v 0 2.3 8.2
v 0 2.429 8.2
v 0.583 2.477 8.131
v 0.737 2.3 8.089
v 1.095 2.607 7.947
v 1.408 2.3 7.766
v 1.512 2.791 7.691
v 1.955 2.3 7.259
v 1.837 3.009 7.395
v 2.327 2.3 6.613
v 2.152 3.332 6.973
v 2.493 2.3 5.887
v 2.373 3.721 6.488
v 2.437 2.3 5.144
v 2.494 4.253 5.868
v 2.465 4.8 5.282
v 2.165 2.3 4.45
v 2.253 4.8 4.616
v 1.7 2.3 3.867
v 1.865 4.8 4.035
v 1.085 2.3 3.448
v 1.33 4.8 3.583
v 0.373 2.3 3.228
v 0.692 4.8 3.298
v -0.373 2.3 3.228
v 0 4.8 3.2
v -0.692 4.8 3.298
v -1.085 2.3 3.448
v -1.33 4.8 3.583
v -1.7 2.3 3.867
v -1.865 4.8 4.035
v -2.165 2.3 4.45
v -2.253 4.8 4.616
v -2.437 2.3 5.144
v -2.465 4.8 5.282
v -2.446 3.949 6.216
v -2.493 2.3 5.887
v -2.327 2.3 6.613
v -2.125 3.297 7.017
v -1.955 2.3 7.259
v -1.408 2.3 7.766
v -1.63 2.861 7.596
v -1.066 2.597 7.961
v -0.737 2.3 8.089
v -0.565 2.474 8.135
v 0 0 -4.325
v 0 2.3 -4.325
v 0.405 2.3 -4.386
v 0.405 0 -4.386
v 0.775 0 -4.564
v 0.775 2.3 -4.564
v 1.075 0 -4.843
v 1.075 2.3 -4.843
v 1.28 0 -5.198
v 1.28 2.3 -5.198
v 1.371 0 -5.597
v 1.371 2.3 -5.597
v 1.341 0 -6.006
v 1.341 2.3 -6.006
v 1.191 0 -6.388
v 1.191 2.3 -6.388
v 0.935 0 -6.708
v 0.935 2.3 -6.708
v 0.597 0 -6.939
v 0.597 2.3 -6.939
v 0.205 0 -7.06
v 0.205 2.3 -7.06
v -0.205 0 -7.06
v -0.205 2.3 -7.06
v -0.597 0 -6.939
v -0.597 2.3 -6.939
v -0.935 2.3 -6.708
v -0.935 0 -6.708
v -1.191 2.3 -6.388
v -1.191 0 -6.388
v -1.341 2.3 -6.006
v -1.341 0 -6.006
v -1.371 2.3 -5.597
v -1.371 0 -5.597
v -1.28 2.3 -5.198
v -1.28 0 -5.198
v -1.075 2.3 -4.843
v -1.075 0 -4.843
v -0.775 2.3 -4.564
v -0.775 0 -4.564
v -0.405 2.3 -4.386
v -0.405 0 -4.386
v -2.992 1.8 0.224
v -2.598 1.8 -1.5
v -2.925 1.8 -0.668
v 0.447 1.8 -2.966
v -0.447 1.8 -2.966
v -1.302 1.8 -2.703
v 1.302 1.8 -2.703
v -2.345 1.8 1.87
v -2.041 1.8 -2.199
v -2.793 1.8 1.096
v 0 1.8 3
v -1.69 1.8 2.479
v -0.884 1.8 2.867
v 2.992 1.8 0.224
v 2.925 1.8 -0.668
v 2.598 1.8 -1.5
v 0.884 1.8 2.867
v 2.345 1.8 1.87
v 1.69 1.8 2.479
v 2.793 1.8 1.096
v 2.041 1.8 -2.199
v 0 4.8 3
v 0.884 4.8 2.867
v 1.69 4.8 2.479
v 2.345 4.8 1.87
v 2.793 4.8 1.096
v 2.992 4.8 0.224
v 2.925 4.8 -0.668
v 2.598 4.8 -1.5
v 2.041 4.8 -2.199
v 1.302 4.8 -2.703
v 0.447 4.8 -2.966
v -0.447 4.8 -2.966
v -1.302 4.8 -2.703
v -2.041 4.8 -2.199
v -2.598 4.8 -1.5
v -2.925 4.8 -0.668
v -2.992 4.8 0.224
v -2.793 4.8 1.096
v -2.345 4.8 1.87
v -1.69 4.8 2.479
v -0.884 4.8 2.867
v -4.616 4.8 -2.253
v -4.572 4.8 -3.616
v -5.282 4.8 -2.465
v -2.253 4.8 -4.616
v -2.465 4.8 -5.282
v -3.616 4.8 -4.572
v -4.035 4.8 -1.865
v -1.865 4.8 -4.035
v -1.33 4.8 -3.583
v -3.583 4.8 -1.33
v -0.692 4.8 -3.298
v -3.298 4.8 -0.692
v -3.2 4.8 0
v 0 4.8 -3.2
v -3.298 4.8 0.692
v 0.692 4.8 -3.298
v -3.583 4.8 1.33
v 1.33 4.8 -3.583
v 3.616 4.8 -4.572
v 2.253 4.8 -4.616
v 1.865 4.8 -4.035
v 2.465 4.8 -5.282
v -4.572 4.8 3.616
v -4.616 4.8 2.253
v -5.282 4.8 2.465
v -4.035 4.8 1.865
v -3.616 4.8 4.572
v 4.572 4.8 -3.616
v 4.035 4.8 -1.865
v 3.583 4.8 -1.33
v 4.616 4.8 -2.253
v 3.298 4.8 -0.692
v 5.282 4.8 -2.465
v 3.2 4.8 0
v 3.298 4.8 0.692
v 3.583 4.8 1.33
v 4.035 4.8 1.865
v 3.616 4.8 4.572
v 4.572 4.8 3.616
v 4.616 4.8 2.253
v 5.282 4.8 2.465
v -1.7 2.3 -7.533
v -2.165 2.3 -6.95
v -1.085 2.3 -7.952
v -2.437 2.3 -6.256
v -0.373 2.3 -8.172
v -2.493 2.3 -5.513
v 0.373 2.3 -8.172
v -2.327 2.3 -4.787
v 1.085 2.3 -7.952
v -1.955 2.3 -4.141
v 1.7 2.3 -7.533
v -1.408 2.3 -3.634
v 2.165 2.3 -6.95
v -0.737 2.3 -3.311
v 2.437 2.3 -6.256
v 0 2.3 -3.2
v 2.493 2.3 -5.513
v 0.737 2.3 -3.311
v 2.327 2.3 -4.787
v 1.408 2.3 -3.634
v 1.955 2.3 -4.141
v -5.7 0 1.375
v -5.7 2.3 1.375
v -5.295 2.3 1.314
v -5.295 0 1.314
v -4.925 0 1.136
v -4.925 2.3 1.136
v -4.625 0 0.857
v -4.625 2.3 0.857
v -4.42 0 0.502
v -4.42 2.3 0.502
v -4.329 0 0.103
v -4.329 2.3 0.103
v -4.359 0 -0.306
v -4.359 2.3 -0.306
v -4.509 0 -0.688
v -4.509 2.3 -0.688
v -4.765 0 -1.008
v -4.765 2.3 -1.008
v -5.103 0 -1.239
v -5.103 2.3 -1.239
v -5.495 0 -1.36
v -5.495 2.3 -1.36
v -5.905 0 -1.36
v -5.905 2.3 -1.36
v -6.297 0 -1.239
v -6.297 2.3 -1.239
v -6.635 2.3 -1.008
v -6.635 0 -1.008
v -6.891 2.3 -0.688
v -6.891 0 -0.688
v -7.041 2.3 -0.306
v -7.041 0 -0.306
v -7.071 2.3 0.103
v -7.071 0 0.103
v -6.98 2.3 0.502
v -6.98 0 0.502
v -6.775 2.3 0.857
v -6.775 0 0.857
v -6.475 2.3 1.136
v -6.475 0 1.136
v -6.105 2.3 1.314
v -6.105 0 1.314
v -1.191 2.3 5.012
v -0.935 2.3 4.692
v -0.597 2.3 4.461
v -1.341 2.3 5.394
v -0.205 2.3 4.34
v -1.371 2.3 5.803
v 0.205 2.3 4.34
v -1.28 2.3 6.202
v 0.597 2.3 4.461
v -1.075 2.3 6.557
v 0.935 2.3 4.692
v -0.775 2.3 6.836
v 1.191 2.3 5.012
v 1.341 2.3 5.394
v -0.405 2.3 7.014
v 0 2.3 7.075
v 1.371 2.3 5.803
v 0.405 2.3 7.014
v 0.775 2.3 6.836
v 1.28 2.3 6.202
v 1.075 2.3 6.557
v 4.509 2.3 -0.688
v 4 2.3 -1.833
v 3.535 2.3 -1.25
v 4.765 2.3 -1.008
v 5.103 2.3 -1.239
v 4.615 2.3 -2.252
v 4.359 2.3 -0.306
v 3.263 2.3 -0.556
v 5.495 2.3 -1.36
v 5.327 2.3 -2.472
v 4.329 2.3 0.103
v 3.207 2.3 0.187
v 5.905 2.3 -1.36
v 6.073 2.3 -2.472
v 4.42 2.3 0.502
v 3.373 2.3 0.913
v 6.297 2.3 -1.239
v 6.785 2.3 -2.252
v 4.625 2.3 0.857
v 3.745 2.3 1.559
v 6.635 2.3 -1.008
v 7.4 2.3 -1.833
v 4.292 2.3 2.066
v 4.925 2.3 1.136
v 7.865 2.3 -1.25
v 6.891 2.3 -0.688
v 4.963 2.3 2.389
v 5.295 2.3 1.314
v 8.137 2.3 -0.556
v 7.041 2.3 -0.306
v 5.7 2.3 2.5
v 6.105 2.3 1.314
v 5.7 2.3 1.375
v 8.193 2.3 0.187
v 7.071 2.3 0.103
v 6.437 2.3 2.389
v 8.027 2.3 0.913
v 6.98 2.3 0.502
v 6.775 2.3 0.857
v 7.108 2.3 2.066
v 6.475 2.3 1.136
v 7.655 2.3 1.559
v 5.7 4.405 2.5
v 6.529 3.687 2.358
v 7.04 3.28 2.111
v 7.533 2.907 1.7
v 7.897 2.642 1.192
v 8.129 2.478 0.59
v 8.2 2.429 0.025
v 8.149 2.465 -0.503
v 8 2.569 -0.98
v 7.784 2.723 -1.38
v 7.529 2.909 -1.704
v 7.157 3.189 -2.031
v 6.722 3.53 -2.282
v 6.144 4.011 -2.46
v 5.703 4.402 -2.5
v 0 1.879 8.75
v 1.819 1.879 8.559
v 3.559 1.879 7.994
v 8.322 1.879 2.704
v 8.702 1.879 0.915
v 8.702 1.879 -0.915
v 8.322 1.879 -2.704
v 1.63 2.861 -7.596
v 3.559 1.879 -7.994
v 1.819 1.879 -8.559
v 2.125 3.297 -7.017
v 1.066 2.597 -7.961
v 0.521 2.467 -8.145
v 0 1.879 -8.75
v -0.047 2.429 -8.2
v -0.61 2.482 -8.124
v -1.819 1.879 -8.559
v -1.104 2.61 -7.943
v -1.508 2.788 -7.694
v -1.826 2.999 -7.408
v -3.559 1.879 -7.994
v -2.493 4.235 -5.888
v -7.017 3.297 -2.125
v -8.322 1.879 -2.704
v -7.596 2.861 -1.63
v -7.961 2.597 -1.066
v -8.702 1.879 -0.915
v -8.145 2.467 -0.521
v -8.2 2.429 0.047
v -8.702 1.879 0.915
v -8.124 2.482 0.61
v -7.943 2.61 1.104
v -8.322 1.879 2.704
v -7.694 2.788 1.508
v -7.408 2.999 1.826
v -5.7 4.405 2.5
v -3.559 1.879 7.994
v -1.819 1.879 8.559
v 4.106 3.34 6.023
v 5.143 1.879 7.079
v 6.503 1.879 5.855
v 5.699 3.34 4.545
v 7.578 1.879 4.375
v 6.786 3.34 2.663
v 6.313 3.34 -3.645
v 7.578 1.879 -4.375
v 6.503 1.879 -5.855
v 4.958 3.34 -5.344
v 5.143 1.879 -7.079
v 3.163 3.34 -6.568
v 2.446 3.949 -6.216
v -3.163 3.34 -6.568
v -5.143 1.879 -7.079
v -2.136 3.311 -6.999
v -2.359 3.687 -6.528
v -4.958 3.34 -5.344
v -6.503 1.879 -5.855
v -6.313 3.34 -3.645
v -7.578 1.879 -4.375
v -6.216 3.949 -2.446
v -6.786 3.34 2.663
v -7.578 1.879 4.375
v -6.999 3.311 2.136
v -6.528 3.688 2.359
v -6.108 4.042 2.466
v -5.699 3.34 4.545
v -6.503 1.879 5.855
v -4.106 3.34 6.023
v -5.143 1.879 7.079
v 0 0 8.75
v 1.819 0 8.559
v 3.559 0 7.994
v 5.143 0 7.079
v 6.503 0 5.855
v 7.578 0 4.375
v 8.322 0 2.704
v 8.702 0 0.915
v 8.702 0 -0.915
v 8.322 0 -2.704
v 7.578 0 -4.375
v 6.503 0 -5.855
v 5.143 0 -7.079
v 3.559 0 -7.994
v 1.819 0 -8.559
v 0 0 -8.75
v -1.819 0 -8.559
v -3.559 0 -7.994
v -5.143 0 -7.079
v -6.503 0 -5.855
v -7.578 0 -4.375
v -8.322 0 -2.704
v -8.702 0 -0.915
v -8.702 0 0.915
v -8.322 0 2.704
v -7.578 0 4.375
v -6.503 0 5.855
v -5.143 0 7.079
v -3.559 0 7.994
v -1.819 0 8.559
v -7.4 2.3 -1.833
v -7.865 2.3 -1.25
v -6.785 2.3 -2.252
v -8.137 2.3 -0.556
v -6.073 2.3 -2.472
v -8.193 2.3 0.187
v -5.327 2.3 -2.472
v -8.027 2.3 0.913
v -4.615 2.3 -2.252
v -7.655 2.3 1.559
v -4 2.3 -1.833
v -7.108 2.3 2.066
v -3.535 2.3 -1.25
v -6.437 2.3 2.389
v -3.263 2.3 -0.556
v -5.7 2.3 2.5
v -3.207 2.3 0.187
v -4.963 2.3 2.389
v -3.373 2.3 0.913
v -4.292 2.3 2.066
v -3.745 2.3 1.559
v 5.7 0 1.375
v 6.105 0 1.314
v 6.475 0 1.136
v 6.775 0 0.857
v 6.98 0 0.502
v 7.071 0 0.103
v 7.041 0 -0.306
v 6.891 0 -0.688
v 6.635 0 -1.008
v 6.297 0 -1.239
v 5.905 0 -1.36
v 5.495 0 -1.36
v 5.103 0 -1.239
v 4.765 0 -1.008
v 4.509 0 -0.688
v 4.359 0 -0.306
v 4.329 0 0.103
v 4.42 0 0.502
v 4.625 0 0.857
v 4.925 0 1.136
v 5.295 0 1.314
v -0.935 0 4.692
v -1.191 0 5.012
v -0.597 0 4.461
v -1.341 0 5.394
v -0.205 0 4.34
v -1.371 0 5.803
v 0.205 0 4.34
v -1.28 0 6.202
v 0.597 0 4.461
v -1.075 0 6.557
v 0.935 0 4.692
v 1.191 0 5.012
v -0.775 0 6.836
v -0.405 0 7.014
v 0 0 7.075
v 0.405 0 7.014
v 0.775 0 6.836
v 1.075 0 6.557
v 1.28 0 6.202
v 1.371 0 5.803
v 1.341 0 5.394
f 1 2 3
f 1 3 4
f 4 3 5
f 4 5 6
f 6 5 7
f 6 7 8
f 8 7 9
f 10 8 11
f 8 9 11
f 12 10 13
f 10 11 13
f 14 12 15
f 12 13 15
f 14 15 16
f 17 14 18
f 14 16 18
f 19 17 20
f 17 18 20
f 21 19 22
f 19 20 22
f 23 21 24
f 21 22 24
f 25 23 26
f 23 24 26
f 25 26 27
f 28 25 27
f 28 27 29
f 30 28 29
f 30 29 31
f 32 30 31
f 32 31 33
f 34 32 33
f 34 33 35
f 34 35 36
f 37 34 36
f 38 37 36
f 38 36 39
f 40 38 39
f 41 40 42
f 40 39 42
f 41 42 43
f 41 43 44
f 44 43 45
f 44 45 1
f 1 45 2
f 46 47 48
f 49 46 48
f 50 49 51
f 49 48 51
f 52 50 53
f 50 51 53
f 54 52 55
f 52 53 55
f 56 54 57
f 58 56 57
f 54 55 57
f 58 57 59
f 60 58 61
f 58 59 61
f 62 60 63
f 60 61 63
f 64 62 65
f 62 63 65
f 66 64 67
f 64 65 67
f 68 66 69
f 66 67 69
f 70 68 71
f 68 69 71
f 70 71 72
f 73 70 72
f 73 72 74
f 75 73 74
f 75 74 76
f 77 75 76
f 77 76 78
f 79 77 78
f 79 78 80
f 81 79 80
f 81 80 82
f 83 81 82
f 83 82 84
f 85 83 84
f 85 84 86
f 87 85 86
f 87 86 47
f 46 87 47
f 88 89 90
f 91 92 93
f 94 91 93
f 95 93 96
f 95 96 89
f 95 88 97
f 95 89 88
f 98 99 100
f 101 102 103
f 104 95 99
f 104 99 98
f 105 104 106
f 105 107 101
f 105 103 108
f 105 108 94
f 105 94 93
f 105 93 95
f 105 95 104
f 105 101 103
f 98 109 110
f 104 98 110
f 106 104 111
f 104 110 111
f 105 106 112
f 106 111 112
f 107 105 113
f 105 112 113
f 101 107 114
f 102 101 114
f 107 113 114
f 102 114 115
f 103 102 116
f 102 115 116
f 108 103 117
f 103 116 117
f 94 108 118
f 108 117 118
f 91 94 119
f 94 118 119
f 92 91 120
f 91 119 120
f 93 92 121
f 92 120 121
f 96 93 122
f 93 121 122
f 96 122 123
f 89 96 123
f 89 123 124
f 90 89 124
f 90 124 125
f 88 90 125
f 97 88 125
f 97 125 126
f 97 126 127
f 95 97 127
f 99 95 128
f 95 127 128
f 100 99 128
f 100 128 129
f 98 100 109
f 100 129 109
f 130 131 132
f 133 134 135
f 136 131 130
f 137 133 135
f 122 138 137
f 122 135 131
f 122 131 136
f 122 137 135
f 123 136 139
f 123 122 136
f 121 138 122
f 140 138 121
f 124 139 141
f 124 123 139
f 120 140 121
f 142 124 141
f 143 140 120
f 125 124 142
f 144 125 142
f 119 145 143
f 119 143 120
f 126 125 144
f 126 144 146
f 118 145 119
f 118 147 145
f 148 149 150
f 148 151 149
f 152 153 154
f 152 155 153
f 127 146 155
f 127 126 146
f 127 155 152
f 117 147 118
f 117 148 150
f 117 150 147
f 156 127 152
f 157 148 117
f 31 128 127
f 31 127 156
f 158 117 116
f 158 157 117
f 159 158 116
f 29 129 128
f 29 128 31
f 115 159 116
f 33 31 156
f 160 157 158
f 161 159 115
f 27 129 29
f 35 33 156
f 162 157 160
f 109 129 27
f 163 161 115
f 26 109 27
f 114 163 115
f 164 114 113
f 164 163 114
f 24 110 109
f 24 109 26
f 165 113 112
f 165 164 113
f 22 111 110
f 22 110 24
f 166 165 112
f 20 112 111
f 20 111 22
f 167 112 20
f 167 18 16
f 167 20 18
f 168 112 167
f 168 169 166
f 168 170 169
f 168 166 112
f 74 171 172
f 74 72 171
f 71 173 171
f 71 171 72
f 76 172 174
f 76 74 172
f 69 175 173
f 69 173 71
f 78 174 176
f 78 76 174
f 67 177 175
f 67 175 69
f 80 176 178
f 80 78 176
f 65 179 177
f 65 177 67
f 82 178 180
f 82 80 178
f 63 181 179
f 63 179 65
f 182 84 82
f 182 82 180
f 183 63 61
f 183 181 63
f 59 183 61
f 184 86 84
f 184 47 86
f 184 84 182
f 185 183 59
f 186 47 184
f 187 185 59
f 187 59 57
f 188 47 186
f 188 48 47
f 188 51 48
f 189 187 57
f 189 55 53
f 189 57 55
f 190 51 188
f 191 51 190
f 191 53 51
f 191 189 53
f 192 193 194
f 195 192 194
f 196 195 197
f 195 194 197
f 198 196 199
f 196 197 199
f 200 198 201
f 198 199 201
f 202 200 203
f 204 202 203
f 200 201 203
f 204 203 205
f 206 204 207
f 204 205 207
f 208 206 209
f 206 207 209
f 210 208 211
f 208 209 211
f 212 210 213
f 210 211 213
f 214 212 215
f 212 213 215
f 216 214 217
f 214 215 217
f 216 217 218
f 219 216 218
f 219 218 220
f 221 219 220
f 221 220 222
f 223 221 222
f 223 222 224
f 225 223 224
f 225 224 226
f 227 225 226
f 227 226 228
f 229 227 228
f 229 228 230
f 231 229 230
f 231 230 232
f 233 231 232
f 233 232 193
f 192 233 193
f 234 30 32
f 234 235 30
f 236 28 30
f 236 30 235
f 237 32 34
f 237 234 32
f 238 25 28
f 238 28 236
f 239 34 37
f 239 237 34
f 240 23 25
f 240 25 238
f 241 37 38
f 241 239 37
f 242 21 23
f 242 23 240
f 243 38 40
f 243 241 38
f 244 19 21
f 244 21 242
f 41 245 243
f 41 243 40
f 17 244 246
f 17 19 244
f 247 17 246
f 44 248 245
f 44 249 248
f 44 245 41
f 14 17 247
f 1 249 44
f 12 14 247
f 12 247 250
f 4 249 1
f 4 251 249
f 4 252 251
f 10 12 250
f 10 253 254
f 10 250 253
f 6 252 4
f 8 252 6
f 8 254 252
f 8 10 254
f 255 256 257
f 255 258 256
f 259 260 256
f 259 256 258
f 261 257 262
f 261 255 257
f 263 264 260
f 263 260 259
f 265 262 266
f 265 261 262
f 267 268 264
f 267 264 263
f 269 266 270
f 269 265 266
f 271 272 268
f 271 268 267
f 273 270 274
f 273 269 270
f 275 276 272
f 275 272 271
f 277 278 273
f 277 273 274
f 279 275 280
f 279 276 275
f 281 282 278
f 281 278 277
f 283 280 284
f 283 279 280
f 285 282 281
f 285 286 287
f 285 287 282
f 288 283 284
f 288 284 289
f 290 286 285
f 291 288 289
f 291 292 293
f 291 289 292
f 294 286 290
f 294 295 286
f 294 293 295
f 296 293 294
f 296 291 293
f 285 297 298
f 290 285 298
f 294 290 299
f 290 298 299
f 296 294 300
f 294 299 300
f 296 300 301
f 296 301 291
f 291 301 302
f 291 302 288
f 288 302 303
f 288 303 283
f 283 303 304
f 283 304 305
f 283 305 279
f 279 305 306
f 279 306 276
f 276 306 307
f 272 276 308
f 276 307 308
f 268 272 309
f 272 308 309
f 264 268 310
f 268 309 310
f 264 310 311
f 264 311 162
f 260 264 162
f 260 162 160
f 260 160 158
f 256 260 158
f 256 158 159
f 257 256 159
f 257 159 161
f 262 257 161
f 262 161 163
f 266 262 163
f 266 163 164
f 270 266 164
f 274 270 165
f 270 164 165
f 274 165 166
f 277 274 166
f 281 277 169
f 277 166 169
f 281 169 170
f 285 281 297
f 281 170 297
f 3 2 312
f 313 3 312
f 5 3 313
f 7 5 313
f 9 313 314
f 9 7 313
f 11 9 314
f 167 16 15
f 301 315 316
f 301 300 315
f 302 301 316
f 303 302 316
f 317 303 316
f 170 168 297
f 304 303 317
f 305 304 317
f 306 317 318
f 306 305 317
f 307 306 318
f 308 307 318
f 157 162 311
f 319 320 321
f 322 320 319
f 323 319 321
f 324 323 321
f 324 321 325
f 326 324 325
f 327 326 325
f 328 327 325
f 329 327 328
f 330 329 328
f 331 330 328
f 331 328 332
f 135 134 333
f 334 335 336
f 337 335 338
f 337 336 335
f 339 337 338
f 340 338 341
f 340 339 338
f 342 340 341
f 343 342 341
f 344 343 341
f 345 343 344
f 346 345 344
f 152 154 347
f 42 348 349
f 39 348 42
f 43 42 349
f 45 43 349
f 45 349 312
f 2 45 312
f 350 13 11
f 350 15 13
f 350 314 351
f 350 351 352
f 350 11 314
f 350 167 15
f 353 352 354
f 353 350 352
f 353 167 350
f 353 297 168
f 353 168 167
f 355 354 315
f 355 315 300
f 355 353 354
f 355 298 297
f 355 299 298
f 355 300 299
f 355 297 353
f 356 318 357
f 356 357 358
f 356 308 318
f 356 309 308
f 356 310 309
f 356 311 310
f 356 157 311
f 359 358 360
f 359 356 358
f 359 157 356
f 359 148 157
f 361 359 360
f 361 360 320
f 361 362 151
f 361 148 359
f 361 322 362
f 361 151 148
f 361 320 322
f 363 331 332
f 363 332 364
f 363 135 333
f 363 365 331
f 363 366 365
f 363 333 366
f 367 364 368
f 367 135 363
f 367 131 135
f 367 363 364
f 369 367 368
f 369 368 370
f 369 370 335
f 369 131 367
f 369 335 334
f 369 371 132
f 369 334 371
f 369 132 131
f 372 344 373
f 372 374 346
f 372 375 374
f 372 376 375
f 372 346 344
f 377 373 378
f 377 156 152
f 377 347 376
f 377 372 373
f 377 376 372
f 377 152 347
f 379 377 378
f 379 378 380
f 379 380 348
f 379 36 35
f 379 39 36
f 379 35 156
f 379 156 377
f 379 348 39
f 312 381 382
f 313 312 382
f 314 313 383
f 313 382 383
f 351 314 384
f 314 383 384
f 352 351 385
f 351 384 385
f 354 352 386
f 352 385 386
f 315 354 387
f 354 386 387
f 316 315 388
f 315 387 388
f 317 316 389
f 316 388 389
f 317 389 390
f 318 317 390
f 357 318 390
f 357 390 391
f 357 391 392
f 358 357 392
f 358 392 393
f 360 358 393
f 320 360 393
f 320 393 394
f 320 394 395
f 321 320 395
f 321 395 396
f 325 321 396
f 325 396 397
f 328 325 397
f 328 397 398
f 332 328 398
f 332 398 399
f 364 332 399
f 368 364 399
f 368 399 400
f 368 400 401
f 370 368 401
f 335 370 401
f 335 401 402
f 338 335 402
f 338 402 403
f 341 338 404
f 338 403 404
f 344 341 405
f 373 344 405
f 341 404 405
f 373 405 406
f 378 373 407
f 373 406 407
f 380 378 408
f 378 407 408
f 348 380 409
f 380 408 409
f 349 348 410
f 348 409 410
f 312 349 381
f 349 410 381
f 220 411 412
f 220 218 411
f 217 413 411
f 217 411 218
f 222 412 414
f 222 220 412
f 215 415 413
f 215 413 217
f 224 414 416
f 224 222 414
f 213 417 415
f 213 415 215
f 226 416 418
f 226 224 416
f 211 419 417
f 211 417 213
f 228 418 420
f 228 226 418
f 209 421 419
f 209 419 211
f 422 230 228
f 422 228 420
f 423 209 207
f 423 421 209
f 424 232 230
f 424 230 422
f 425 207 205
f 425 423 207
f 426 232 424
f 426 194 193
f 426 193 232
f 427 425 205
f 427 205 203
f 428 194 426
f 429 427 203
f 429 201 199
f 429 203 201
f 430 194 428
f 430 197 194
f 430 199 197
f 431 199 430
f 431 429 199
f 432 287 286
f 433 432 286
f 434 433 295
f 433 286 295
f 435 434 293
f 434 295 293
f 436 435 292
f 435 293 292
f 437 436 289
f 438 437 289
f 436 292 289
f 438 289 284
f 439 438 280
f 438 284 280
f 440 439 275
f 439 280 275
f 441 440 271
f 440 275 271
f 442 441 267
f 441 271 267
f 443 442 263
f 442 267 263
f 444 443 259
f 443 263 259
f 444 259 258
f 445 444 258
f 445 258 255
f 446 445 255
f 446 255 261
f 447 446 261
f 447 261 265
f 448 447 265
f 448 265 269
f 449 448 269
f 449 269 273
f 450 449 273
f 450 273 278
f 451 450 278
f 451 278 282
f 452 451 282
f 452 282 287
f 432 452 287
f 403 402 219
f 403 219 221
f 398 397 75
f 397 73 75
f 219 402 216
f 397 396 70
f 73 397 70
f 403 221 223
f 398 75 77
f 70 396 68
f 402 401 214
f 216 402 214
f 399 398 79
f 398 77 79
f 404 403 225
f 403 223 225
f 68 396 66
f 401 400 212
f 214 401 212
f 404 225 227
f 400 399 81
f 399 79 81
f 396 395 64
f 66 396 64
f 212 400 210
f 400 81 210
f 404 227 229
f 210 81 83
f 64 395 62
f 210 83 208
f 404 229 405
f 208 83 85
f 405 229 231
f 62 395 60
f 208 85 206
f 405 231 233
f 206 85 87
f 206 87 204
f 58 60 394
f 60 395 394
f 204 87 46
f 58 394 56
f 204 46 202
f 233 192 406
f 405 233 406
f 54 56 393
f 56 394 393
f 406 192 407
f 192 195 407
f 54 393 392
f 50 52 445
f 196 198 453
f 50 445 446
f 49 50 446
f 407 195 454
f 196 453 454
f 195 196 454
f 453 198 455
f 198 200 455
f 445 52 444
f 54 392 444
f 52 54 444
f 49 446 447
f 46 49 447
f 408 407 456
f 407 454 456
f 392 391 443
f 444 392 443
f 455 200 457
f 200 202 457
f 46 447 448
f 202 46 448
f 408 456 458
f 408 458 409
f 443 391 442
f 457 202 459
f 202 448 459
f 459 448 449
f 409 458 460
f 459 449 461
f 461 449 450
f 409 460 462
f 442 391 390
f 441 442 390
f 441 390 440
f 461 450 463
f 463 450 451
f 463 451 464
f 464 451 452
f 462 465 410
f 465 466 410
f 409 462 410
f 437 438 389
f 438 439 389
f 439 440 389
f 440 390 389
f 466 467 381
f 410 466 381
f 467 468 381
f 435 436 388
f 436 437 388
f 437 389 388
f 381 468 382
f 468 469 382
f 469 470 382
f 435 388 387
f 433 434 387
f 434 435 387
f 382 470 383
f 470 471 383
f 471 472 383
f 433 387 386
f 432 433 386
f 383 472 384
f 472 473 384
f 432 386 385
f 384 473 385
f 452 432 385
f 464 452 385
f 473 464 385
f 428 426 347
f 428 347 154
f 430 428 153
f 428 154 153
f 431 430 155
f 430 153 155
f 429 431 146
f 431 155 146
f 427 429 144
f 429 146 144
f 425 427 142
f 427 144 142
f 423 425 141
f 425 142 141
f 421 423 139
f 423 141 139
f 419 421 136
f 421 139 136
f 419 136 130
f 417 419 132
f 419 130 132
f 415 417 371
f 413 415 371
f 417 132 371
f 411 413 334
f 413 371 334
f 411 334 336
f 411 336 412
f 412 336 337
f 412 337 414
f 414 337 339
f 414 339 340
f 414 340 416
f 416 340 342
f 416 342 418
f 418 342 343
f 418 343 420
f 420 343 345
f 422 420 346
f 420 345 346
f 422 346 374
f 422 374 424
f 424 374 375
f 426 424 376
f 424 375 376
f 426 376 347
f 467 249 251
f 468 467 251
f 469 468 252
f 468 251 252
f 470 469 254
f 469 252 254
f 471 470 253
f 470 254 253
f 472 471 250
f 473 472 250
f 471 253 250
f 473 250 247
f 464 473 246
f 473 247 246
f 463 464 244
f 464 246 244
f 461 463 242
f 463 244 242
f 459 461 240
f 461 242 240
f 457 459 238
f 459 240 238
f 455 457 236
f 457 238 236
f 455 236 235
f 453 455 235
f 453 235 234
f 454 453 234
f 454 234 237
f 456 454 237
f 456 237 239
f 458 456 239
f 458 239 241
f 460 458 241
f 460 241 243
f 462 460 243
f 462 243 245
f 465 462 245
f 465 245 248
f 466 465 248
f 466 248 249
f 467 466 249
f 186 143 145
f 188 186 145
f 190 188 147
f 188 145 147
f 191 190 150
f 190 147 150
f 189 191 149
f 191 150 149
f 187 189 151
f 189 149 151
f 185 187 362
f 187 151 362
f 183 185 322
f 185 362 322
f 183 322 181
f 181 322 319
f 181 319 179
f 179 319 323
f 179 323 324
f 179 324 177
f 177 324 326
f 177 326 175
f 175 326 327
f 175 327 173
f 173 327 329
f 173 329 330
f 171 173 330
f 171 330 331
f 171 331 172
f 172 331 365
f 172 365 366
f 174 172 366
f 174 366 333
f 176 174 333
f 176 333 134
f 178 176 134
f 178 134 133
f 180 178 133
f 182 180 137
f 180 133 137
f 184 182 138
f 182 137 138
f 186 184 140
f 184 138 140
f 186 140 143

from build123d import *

# Parameters (mm, degrees)
SKETCH1_R           = 8.75
BOSS_EXTRUDE1_DEPTH = 4.8
SKETCH2_R           = 3
CUT_EXTRUDE1_DEPTH  = 3
SKETCH3_R           = 2.5
CUT_EXTRUDE2_DEPTH  = 2.5
SKETCH4_R           = 1.375
CUT_EXTRUDE3_DEPTH  = 2.5
CHAMFER1_SIZE       = 2.921


with BuildPart() as part:
    # Sketch1 → Boss-Extrude1 (new body)
    with BuildSketch(Plane(origin=(0, 0, 0), x_dir=(1, 0, 0), z_dir=(0, 1, 0))):
        with Locations(Location((0, 0, 0), (0, 0, 270))):
            Circle(SKETCH1_R)
    extrude(amount=BOSS_EXTRUDE1_DEPTH)

    # Sketch2 → Cut-Extrude1 (cut)
    with BuildSketch(Plane(origin=(0, 4.8, 0), x_dir=(1, 0, 0), z_dir=(0, 1, 0))):
        with Locations(Location((0, 0, 0), (0, 0, 270))):
            Circle(SKETCH2_R)
    extrude(amount=-CUT_EXTRUDE1_DEPTH, mode=Mode.SUBTRACT)

    # Sketch3 → Cut-Extrude2 (cut)
    with BuildSketch(Plane(origin=(0, 4.8, 0), x_dir=(1, 0, 0), z_dir=(0, 1, 0))):
        with Locations(Location((-5.7, 0, 0), (0, 0, 270))):
            Circle(SKETCH3_R)
        with Locations(Location((0, 5.7, 0), (0, 0, 270))):
            Circle(SKETCH3_R)
        with Locations(Location((5.7, 0, 0), (0, 0, 270))):
            Circle(SKETCH3_R)
        with Locations(Location((0, -5.7, 0), (0, 0, 270))):
            Circle(SKETCH3_R)
    extrude(amount=-CUT_EXTRUDE2_DEPTH, mode=Mode.SUBTRACT)

    # Sketch4 → Cut-Extrude3 (cut)
    with BuildSketch(Plane(origin=(0, 2.3, 0), x_dir=(1, 0, 0), z_dir=(0, 1, 0))):
        with Locations(Location((-5.7, 0, 0), (0, 0, 270))):
            Circle(SKETCH4_R)
        with Locations(Location((0, 5.7, 0), (0, 0, 270))):
            Circle(SKETCH4_R)
        with Locations(Location((5.7, 0, 0), (0, 0, 270))):
            Circle(SKETCH4_R)
        with Locations(Location((0, -5.7, 0), (0, 0, 270))):
            Circle(SKETCH4_R)
    extrude(amount=-CUT_EXTRUDE3_DEPTH, mode=Mode.SUBTRACT)

    # Chamfer1
    # the kernel refuses this chamfer: 2.921 mm, written as the material it takes off along each edge
    with BuildSketch(Plane(origin=(0, 4.8, 0), x_dir=(0, 0, 1), z_dir=(-1, 0, 0))) as chamfer1_piece_1:
        Polygon((8.75, -CHAMFER1_SIZE), (8.75 - CHAMFER1_SIZE, 0), (8.75, 0), align=None)
    revolve(axis=Axis((0, 4.8, 0), (0, 1, 0)), mode=Mode.SUBTRACT)


solid = part.part
